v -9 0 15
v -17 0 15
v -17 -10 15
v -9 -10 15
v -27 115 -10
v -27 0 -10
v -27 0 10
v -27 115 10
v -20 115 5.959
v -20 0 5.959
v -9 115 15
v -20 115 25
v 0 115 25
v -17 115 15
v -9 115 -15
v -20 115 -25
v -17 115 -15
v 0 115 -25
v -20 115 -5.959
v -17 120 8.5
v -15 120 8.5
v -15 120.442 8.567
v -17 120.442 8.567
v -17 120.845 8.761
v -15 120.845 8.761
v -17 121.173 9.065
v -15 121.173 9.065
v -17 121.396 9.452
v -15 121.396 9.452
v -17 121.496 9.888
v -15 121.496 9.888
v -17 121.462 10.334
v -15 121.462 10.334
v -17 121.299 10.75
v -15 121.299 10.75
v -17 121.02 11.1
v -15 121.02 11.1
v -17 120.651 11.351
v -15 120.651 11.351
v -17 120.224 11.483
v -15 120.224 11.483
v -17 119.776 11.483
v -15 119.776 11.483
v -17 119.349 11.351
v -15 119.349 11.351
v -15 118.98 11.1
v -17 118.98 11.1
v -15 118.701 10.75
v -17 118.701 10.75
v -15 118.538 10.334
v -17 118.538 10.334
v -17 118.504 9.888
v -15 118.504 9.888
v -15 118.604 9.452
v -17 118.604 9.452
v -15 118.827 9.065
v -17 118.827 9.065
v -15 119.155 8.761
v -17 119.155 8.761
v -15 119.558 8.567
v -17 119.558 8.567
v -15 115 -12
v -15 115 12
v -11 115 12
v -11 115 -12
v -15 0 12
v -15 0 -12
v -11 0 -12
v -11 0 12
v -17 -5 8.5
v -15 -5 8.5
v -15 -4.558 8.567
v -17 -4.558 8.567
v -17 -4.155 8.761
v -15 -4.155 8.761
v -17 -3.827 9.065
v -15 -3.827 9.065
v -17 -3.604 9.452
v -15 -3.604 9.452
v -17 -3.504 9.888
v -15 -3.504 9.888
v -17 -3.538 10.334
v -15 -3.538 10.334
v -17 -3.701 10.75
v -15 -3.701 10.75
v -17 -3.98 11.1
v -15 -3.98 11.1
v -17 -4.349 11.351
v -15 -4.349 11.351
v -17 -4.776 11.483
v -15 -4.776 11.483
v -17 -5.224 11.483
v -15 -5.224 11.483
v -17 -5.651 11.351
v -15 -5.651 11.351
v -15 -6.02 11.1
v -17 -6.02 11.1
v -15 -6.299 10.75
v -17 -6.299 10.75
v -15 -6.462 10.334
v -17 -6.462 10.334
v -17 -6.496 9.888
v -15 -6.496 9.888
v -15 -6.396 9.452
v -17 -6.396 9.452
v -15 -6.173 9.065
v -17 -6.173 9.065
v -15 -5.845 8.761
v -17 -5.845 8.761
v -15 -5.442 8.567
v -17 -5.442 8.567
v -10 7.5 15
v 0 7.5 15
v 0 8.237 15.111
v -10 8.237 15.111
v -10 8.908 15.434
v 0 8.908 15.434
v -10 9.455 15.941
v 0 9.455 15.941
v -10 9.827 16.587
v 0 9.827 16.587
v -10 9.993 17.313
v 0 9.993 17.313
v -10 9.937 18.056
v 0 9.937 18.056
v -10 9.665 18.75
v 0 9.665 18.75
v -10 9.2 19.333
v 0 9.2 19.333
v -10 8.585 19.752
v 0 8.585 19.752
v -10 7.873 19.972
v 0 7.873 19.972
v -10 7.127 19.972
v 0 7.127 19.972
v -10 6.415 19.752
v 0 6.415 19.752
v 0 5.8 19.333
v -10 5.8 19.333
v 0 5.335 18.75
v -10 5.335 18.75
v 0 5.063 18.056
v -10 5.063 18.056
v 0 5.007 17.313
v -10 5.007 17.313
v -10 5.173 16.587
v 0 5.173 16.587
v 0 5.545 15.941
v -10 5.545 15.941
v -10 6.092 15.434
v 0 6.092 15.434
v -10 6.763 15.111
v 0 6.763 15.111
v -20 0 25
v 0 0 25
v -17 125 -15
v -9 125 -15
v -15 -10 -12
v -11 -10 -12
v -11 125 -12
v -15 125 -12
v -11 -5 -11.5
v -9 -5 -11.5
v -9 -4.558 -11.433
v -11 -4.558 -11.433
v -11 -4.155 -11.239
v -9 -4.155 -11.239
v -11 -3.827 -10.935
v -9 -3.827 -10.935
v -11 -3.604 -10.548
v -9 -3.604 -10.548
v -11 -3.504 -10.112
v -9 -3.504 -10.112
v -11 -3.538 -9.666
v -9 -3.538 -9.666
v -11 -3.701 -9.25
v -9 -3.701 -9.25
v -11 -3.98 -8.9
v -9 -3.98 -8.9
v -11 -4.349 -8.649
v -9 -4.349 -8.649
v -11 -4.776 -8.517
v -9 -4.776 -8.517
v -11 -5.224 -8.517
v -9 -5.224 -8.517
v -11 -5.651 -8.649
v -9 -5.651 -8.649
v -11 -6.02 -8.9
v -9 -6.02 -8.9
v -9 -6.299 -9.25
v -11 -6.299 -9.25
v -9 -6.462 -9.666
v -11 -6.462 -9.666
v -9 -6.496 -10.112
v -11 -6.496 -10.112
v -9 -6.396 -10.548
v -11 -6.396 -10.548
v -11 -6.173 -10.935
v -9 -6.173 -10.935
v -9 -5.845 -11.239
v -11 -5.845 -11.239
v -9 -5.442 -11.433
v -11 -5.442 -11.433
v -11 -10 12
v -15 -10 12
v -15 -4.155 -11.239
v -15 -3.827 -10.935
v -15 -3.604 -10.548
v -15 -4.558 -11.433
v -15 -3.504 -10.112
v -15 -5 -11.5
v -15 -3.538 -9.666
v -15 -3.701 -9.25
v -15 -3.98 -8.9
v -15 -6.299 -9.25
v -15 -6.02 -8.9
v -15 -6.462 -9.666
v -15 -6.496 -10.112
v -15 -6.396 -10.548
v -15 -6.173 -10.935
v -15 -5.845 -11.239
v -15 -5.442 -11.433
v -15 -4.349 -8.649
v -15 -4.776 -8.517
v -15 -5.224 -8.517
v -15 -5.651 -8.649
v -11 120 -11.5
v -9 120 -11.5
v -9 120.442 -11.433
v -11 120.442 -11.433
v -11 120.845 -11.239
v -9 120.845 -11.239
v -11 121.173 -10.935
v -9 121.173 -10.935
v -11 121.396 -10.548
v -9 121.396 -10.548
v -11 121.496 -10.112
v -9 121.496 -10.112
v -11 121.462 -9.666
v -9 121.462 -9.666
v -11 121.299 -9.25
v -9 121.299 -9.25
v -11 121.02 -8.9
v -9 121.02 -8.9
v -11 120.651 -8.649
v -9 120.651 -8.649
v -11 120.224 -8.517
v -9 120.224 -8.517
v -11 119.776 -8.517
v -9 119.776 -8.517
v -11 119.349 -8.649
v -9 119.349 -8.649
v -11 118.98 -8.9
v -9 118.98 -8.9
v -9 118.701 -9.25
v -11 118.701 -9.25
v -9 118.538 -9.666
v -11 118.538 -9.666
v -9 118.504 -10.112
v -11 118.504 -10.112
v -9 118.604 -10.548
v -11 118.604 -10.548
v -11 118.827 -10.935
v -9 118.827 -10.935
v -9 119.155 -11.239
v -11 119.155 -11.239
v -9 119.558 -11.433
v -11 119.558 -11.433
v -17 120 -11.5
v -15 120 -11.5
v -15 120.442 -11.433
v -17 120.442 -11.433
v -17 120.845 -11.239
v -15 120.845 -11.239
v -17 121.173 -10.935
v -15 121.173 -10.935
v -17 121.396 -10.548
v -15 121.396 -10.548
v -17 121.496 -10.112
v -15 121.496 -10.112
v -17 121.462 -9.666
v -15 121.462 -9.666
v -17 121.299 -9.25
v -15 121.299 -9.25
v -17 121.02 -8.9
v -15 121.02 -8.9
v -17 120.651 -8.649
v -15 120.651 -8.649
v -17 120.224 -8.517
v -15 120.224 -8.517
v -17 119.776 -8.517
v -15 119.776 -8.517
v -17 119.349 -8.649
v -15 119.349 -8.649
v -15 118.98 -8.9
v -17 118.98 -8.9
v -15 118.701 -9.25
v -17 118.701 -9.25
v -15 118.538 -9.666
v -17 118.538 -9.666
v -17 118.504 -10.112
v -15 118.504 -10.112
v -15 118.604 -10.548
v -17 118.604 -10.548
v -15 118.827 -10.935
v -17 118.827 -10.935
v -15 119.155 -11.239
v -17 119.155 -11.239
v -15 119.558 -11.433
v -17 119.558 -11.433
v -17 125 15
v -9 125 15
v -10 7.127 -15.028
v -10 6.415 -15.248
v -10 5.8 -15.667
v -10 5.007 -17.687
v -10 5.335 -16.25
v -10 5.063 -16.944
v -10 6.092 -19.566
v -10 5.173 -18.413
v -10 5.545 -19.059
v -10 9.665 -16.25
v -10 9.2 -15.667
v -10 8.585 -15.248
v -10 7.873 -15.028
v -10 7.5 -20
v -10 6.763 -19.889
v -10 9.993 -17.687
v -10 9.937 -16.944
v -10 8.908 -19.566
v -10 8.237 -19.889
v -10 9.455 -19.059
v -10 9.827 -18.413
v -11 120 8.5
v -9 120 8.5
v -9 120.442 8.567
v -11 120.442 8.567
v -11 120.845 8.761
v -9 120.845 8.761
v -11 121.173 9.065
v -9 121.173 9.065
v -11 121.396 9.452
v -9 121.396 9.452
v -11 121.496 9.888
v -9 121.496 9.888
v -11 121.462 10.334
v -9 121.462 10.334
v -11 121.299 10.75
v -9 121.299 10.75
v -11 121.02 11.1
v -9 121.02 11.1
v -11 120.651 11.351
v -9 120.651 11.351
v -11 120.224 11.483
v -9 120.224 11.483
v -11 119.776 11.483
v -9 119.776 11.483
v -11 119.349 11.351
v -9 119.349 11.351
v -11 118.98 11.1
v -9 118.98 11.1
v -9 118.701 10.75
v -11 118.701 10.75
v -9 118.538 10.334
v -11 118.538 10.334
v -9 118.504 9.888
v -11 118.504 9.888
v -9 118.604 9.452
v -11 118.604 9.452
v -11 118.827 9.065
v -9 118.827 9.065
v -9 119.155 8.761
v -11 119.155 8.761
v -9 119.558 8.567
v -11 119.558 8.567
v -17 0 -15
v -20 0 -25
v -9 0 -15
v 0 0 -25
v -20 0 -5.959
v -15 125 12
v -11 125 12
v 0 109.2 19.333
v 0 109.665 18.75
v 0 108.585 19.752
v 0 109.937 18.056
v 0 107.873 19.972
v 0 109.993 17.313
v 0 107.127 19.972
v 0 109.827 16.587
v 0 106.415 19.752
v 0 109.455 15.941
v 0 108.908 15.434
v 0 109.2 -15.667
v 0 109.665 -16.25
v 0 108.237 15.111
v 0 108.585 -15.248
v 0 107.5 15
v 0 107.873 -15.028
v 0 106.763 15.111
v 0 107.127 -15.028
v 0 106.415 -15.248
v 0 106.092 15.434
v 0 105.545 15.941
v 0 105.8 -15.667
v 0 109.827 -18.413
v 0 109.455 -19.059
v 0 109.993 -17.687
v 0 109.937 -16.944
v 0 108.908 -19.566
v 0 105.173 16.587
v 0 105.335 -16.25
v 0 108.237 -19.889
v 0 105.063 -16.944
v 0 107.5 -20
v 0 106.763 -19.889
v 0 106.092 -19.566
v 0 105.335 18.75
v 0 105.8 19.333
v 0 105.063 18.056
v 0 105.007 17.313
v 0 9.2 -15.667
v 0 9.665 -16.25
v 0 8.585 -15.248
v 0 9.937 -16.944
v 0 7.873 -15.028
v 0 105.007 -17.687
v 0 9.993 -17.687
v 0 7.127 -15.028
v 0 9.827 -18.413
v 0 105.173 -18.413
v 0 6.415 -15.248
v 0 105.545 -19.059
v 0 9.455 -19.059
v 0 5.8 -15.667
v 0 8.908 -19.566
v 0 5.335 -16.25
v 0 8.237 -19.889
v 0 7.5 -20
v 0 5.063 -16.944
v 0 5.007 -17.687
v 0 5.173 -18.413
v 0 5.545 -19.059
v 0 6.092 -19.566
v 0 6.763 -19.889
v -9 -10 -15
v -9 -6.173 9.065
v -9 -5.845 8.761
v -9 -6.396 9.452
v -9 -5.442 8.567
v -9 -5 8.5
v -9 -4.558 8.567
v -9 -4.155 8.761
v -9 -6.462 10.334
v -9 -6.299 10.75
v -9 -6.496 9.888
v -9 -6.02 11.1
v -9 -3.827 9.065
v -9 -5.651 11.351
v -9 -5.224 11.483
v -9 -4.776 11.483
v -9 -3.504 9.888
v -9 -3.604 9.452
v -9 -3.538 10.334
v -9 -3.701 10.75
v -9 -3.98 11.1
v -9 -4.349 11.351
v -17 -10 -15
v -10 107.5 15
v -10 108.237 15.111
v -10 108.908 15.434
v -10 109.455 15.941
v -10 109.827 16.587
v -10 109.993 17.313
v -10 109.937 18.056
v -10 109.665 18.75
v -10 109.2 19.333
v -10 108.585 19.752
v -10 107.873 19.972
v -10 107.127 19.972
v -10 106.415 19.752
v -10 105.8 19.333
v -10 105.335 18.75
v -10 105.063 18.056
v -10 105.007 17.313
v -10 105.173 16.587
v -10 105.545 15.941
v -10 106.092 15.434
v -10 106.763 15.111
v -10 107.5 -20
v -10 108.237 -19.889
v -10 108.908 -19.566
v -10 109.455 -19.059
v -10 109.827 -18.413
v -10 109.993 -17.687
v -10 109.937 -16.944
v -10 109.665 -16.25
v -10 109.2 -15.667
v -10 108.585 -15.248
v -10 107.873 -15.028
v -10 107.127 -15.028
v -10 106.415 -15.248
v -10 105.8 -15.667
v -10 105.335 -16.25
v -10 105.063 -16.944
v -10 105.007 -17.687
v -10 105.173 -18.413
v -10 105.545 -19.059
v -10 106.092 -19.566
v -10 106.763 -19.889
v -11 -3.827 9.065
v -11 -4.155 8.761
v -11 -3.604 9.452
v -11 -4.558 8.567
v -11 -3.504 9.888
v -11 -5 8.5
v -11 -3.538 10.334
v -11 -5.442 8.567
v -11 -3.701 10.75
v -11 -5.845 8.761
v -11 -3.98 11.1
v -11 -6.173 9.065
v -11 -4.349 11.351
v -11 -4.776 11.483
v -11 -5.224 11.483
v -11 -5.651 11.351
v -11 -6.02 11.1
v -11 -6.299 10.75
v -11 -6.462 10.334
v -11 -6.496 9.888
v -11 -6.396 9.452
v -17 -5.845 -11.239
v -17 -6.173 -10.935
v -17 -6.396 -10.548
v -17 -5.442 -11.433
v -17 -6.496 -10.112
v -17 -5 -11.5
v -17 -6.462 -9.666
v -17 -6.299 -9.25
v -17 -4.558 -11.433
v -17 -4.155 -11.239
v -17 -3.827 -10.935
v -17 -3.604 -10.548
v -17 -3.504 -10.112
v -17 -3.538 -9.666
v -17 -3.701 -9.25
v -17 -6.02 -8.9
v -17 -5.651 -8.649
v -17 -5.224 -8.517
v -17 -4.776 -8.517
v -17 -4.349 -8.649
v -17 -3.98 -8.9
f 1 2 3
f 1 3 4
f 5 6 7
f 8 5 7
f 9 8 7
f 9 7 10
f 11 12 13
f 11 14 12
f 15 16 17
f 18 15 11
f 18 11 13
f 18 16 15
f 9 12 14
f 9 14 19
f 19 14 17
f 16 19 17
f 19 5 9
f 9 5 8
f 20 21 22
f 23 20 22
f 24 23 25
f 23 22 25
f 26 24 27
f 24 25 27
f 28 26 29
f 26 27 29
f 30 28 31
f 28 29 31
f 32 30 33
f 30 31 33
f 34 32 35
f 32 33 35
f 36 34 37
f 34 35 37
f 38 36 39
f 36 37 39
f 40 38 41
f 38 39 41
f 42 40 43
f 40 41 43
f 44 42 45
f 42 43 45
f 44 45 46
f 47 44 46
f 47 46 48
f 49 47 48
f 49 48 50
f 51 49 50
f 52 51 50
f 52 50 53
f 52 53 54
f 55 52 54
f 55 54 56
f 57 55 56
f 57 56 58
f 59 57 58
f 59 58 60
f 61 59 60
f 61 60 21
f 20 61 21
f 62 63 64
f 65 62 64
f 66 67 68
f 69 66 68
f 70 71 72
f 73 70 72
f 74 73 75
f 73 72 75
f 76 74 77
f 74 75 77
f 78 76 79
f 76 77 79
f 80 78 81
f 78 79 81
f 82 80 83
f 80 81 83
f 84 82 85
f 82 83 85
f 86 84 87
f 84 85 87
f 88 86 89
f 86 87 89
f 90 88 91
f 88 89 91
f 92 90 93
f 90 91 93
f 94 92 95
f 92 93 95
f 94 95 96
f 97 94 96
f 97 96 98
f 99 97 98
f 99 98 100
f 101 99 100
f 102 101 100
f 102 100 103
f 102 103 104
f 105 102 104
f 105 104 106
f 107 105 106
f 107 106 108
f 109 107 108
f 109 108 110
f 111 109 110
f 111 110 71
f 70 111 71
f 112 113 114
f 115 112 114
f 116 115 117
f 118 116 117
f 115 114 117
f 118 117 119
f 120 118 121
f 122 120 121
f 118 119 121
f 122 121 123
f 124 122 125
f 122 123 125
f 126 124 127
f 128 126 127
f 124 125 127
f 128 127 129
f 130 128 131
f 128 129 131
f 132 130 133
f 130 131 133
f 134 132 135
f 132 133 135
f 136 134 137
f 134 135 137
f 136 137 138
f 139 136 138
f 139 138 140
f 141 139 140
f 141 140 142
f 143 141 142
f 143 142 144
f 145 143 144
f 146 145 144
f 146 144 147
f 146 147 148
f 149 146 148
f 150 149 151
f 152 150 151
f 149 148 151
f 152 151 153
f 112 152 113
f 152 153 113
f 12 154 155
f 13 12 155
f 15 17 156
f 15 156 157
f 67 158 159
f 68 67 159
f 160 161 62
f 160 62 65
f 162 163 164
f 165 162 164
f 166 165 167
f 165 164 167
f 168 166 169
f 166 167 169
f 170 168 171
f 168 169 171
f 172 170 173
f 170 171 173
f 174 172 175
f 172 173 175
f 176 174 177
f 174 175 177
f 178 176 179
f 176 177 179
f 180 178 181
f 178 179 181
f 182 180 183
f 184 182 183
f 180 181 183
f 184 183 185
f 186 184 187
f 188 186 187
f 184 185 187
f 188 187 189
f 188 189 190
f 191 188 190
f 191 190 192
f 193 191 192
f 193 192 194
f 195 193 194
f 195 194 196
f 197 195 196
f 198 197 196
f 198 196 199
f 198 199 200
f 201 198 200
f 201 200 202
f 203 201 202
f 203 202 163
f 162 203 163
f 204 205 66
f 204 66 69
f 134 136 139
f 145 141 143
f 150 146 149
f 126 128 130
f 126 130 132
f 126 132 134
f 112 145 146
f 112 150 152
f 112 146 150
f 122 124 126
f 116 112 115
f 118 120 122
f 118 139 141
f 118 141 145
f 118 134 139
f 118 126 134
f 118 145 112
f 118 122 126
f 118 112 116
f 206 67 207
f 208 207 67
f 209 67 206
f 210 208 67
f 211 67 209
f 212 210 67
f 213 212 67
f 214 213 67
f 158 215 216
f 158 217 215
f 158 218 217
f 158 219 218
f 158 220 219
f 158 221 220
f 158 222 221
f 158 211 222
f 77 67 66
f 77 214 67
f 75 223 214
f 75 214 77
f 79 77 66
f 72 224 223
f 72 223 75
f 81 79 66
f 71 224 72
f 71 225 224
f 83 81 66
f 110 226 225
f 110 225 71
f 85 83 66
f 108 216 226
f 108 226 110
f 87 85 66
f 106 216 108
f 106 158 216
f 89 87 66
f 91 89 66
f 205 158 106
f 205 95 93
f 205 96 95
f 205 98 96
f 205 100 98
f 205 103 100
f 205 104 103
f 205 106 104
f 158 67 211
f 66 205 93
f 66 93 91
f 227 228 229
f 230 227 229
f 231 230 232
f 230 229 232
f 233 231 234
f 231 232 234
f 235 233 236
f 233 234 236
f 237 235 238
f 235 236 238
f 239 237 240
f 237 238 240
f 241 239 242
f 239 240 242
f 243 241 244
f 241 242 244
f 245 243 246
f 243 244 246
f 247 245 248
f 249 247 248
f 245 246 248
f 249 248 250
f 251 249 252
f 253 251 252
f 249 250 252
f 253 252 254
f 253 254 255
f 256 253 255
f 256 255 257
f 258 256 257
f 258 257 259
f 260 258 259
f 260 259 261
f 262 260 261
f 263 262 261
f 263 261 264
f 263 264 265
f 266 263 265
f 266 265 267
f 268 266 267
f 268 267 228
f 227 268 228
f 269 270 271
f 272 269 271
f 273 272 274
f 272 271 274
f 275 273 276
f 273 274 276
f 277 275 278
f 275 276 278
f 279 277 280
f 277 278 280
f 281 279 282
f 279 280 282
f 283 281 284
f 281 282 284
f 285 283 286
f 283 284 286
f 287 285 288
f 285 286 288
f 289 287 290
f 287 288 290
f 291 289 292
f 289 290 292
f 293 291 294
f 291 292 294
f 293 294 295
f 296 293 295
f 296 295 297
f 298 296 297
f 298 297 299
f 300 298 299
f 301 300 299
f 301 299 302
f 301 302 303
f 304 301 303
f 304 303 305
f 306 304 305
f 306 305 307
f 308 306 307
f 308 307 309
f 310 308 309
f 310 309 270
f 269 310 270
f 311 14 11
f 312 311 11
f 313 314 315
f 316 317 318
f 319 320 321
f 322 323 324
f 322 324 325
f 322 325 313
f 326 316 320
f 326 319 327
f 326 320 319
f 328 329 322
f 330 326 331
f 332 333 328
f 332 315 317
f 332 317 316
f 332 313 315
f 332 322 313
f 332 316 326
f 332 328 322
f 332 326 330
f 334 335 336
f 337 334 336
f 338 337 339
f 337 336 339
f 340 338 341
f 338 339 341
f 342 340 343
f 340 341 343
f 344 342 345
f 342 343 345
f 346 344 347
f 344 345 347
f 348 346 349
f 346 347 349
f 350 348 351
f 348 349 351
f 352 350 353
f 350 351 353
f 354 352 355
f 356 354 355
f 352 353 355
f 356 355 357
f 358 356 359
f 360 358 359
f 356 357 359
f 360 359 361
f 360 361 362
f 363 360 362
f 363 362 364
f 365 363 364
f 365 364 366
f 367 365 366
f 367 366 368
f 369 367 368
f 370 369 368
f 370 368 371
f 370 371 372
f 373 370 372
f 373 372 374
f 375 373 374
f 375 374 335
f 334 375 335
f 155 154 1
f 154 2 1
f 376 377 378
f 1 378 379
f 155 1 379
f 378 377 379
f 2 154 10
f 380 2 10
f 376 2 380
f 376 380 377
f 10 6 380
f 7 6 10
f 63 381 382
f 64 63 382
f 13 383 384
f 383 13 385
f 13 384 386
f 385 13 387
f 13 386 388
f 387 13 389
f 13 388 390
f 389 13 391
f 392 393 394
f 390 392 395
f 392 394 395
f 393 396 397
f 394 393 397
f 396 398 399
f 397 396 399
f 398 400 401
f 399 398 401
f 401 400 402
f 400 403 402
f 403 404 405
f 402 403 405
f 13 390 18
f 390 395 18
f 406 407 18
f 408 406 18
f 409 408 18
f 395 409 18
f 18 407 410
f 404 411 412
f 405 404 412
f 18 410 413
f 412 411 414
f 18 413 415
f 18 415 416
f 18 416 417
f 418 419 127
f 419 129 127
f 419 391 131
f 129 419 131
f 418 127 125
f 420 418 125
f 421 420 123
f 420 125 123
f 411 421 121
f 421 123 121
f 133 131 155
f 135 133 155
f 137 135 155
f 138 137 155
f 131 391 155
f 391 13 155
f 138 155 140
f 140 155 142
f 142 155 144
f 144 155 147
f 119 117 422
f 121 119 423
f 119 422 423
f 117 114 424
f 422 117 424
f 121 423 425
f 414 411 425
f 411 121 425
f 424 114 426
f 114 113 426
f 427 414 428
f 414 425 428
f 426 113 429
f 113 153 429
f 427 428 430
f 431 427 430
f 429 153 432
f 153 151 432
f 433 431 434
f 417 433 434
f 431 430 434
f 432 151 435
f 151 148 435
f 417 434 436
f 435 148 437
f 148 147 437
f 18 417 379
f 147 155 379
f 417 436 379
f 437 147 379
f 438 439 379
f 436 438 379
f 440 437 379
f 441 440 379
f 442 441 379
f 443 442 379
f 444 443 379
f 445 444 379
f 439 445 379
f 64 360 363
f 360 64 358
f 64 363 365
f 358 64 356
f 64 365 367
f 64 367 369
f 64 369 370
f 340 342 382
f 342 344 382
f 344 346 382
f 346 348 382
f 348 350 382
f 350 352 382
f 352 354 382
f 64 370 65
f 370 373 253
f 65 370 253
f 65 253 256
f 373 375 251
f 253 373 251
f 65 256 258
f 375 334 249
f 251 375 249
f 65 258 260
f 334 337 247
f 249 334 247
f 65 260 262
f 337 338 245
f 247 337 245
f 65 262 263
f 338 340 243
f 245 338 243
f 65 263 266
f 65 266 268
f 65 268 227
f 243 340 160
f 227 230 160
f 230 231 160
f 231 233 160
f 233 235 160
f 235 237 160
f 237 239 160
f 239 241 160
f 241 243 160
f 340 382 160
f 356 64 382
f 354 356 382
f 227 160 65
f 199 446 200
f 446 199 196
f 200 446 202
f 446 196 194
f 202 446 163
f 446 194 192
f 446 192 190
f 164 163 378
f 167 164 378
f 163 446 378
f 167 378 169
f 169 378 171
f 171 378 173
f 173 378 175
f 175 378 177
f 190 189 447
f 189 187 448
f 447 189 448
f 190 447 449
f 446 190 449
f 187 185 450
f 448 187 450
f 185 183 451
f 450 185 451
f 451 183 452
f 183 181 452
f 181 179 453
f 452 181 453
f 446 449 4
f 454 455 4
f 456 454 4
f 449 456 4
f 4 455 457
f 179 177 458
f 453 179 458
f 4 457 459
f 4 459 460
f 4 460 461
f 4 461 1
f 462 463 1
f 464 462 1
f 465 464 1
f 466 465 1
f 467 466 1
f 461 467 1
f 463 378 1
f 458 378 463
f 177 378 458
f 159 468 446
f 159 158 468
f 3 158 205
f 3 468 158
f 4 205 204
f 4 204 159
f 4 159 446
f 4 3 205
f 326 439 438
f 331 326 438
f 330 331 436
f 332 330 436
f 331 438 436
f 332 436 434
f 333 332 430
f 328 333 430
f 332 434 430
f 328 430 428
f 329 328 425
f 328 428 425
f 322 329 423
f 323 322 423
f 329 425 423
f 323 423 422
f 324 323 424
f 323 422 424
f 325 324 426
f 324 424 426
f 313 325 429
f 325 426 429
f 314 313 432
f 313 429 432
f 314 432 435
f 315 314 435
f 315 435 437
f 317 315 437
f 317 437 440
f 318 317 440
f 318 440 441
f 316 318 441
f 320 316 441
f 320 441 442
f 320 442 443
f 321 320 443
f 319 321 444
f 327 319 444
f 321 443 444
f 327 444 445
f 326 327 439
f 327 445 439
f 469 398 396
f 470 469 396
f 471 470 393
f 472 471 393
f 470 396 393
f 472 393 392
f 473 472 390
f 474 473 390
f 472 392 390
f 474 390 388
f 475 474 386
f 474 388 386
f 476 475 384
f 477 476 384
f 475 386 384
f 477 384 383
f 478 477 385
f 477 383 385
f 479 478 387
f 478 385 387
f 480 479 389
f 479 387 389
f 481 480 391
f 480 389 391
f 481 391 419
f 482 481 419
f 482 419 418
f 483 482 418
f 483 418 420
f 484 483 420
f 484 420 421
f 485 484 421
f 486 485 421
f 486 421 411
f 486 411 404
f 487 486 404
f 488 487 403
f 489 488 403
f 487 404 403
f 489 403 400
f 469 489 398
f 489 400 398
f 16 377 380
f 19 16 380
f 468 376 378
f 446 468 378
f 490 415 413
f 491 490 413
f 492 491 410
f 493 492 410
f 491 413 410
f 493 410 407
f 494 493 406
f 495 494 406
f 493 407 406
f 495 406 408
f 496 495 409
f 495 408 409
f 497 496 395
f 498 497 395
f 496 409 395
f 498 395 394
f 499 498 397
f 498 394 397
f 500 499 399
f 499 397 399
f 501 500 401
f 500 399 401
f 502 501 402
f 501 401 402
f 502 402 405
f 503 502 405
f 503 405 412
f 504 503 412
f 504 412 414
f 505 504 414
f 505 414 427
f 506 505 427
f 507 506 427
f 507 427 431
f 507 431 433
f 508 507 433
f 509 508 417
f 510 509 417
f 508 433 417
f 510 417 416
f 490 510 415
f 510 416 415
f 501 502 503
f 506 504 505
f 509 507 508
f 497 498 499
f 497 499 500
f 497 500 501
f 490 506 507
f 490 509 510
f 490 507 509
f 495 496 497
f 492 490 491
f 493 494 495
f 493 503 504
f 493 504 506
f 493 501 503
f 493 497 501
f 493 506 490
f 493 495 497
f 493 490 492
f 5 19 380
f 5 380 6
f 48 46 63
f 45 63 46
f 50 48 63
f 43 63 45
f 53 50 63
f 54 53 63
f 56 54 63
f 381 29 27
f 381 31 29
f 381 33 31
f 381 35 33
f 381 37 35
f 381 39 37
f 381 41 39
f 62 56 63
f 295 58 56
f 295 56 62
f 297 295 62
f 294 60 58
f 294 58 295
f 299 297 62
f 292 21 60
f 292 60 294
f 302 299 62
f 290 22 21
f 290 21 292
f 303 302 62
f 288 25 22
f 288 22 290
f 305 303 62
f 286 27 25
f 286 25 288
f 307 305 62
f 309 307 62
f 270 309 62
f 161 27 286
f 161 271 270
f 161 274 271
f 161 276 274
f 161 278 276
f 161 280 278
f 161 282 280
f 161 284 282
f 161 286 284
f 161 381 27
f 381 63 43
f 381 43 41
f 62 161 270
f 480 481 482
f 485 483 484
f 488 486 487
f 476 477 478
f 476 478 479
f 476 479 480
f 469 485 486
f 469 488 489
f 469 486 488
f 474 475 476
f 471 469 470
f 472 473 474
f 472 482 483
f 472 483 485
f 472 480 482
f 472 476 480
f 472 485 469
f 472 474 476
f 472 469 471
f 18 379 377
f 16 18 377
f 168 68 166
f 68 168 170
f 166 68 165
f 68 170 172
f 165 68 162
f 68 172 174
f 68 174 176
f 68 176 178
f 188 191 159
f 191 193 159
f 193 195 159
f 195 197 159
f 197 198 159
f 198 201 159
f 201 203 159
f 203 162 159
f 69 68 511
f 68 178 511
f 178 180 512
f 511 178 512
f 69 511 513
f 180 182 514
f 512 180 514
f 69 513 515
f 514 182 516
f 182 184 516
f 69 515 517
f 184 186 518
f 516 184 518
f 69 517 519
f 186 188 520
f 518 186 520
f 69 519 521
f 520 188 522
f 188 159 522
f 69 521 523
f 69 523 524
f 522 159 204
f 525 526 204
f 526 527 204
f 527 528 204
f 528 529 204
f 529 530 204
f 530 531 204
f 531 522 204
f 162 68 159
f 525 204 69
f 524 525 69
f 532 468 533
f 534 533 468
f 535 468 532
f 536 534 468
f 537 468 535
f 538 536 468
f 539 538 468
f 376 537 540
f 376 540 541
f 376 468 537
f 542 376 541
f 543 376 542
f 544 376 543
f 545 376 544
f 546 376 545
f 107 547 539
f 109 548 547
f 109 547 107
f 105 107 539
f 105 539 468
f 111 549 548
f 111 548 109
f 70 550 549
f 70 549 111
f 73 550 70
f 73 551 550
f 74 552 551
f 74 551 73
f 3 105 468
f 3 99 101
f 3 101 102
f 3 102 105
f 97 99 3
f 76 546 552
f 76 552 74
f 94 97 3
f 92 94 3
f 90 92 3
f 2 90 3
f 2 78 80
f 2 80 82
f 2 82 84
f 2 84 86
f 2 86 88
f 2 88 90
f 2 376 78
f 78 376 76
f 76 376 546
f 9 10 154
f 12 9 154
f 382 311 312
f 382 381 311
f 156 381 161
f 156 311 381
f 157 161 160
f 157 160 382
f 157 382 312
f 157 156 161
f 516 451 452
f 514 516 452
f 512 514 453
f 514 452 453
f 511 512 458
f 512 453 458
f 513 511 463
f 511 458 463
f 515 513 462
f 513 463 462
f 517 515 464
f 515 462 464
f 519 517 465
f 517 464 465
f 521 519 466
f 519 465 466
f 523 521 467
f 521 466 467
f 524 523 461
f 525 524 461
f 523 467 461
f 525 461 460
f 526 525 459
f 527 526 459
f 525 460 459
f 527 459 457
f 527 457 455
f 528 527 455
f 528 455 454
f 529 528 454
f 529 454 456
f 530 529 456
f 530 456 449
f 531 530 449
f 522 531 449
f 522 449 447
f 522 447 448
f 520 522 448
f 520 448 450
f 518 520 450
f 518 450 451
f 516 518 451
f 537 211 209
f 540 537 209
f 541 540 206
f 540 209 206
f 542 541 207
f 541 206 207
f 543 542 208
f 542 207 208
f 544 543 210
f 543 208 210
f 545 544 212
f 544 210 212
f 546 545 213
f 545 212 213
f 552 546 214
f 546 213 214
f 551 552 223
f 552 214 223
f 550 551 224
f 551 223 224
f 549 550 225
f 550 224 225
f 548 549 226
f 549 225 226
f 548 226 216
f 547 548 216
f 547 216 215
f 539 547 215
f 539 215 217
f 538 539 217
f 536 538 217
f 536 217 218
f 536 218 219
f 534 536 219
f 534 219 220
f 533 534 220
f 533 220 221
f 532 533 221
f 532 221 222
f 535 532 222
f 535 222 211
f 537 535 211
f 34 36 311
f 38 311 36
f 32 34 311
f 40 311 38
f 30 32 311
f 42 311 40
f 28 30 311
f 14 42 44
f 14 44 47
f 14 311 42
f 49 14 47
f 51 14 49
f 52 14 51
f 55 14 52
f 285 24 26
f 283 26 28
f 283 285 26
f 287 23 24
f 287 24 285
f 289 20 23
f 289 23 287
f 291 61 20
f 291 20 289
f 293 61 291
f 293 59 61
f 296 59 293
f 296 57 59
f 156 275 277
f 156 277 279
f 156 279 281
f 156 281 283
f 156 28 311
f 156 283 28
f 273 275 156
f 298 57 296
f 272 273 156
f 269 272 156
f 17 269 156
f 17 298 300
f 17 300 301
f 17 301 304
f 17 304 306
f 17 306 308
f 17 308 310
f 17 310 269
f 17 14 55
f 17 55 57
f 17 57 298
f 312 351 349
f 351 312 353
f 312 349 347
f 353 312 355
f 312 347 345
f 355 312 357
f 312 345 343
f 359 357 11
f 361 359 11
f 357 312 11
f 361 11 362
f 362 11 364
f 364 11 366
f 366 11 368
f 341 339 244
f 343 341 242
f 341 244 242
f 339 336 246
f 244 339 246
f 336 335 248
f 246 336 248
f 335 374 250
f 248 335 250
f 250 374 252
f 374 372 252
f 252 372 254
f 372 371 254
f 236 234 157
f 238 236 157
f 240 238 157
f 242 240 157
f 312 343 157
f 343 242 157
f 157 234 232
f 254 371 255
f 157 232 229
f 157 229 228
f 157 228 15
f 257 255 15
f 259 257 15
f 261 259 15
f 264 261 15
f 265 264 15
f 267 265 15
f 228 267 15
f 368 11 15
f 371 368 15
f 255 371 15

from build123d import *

# Parameters (mm, degrees)
BOSS_EXTRUDE1_DEPTH = 115
SKETCH2_R           = 2.5
CUT_EXTRUDE1_DEPTH  = 10
SKETCH3_W           = 8
SKETCH3_H           = 30
BOSS_EXTRUDE2_DEPTH = 10
SKETCH4_W           = 8
SKETCH4_H           = 30
BOSS_EXTRUDE3_DEPTH = 10
SKETCH5_W           = 4
SKETCH5_H           = 24
CUT_EXTRUDE2_DEPTH  = 10
SKETCH6_W           = 4
SKETCH6_H           = 24
CUT_EXTRUDE3_DEPTH  = 10
SKETCH7_R           = 1.5
CUT_EXTRUDE4_DEPTH  = 32


with BuildPart() as part:
    # Sketch1 → Boss-Extrude1 (new body)
    with BuildSketch(Plane(origin=(0, 0, 0), x_dir=(1, 0, 0), z_dir=(0, 1, 0))):
        Polygon((-27, 10), (-27, -10), (-20, -5.958548116), (-20, -25), (0, -25), (0, 25), (-20, 25), (-20, 5.958548116), align=None)
    extrude(amount=BOSS_EXTRUDE1_DEPTH)

    # Sketch2 → Cut-Extrude1 (cut)
    with BuildSketch(Plane(origin=(0, 0, 0), x_dir=(0, 0, -1), z_dir=(1, 0, 0))):
        with Locations((-17.5, 107.5)):
            Circle(SKETCH2_R)
        with Locations((-17.5, 7.5)):
            Circle(SKETCH2_R)
        with Locations((17.5, 7.5)):
            Circle(SKETCH2_R)
        with Locations((17.5, 107.5)):
            Circle(SKETCH2_R)
    extrude(amount=-CUT_EXTRUDE1_DEPTH, mode=Mode.SUBTRACT)

    # Sketch3 → Boss-Extrude2 (add)
    with BuildSketch(Plane(origin=(0, 115, 0), x_dir=(1, 0, 0), z_dir=(0, 1, 0))):
        with Locations((-13, 0)):
            Rectangle(SKETCH3_W, SKETCH3_H)
    extrude(amount=BOSS_EXTRUDE2_DEPTH)

    # Sketch4 → Boss-Extrude3 (add)
    with BuildSketch(Plane.XZ):
        with Locations((-13, 0)):
            Rectangle(SKETCH4_W, SKETCH4_H)
    extrude(amount=BOSS_EXTRUDE3_DEPTH)

    # Sketch5 → Cut-Extrude2 (cut)
    with BuildSketch(Plane.XZ.offset(10)):
        with Locations((-13, 0)):
            Rectangle(SKETCH5_W, SKETCH5_H)
    extrude(amount=-CUT_EXTRUDE2_DEPTH, mode=Mode.SUBTRACT)

    # Sketch6 → Cut-Extrude3 (cut)
    with BuildSketch(Plane(origin=(0, 125, 0), x_dir=(1, 0, 0), z_dir=(0, 1, 0))):
        with Locations((-13, 0)):
            Rectangle(SKETCH6_W, SKETCH6_H)
    extrude(amount=-CUT_EXTRUDE3_DEPTH, mode=Mode.SUBTRACT)

    # Sketch7 → Cut-Extrude4 (cut)
    with BuildSketch(Plane(origin=(0, 0, 0), x_dir=(0, 0, -1), z_dir=(1, 0, 0))):
        with Locations((-10, 120)):
            Circle(SKETCH7_R)
        with Locations((-10, -5)):
            Circle(SKETCH7_R)
        with Locations((10, -5)):
            Circle(SKETCH7_R)
        with Locations((10, 120)):
            Circle(SKETCH7_R)
    extrude(amount=-CUT_EXTRUDE4_DEPTH, mode=Mode.SUBTRACT)


solid = part.part
